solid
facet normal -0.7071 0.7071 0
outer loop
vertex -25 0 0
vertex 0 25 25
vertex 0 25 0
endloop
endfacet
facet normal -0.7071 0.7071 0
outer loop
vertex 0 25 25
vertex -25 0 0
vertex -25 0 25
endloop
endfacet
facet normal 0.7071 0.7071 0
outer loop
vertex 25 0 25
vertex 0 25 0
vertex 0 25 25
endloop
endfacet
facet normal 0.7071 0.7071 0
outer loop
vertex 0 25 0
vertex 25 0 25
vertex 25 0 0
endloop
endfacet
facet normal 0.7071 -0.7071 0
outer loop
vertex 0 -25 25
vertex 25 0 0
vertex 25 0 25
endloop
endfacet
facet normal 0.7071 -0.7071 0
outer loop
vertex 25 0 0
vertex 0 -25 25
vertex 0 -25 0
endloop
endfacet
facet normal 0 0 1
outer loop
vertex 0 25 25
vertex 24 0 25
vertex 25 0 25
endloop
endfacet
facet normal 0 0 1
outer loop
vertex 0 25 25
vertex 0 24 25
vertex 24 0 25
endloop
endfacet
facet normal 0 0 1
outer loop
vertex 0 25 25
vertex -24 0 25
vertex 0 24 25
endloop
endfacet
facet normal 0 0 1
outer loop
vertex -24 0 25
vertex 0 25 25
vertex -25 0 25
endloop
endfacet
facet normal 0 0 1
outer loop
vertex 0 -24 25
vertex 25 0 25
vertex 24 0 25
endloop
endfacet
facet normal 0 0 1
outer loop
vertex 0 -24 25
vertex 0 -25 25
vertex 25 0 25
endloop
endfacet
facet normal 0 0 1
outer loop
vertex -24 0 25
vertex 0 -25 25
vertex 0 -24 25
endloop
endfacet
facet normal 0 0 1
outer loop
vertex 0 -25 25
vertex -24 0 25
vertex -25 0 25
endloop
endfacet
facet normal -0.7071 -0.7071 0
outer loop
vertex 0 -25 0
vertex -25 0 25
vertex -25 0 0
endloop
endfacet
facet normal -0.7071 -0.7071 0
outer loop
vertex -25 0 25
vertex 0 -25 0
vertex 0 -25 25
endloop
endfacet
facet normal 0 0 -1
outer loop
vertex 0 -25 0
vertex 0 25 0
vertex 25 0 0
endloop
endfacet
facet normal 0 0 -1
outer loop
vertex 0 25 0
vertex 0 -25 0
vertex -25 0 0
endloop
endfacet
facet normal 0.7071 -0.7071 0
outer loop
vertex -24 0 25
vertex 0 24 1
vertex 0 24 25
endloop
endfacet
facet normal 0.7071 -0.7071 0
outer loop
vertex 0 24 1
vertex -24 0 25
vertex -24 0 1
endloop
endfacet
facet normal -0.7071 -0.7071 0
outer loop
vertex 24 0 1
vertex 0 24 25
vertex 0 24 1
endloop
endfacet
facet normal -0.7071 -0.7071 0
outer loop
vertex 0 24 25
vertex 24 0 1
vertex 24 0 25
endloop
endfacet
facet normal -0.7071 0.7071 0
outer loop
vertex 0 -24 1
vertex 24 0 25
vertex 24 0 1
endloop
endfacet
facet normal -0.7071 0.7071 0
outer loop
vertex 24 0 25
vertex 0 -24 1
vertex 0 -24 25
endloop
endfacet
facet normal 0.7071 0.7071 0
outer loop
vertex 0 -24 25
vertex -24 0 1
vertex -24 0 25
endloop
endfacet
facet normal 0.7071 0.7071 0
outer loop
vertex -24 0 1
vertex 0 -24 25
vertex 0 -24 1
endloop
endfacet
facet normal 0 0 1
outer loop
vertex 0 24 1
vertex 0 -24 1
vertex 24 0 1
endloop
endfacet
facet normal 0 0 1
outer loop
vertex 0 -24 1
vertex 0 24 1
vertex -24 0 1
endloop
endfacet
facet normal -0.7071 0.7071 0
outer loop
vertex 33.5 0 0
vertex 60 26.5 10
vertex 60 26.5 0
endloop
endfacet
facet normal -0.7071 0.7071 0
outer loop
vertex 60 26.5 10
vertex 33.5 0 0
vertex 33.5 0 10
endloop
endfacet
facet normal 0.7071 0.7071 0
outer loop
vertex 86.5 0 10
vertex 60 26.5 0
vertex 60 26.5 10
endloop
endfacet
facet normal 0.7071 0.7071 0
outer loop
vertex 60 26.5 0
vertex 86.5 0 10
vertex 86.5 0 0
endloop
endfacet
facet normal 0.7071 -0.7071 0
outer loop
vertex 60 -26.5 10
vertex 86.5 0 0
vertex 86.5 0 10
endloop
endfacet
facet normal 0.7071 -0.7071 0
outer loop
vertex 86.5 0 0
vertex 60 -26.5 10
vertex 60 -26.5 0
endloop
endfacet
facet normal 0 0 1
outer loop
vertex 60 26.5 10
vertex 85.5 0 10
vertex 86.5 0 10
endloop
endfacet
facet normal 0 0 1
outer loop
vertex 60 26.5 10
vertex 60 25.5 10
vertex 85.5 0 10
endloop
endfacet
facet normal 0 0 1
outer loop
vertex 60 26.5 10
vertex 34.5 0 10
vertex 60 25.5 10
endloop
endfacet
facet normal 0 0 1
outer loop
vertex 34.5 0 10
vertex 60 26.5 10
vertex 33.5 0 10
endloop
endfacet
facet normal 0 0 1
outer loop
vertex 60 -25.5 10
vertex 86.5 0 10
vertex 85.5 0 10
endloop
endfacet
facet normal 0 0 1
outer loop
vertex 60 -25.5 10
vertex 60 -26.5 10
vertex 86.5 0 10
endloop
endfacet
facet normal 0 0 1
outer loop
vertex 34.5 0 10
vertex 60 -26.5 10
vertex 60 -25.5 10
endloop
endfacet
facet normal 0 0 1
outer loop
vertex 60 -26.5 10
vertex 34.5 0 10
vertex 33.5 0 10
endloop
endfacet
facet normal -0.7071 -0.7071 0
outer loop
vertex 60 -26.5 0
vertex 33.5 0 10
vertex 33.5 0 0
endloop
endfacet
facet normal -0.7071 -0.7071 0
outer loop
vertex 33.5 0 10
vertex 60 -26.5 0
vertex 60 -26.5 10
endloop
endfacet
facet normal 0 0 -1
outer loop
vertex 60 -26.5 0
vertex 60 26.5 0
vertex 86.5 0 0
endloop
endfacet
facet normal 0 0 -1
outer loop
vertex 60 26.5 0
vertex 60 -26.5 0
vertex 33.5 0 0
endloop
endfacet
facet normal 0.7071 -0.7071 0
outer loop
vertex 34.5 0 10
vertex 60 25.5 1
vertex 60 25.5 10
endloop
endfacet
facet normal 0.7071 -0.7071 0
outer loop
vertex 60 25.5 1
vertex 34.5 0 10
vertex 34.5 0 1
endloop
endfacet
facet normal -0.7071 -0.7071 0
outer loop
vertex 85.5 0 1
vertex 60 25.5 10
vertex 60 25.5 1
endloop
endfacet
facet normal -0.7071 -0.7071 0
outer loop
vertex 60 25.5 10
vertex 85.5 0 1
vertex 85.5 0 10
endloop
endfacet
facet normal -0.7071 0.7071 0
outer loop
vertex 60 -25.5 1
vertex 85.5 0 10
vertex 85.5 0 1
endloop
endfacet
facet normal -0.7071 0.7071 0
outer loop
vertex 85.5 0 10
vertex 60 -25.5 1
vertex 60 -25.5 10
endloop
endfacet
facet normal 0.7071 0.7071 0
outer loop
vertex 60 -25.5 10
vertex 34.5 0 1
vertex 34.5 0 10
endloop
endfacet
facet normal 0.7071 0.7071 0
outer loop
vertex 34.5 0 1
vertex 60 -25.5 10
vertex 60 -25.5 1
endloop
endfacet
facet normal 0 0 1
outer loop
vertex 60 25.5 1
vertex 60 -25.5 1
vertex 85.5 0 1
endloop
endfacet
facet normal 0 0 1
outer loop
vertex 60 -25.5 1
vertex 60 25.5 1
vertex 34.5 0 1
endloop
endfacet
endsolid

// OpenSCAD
//Parameterised N sided box
// Glyn Cowles July 2014
//Parts to print
parts = "both";//[both,box,lid]
//Thickness of sides
thickness=1;//[1:10] 
//Outside diameter of box
diam=50;//[10:200]   
//Height of box
boxh=25;//[5:150]   
//Height of lid
lidh=10;//[3:20]
//Looseness factor of lid
looseness=10;//[0:20]
//Number of sides
sides=4;//[3:60]

$fn=sides;
loose=looseness/10; // ie looseness = 5 loose =0.5mm

assemble(); 

//-----------------------------------------------------------------------
module tube(d,h,th) {
rad=d/2;
difference() {
cylinder(h=h,r=rad);
cylinder(h=h,r=rad-th);
}
}
//-----------------------------------------------------------------------
module box() {
union(){
	tube(diam,boxh,thickness);
	tube(diam,thickness,diam);
}
}
//-----------------------------------------------------------------------

module lid(){
union() {
	tube(diam+thickness*2+loose,lidh,thickness);
	tube(diam+thickness*2+loose,thickness,diam+thickness*2+loose);
 }
}
//-----------------------------------------------------------------------
module assemble() {
if (parts=="box" || parts=="both")  box(); 
if (parts=="lid" || parts=="both") translate([diam+10,0,0]) lid();
};



